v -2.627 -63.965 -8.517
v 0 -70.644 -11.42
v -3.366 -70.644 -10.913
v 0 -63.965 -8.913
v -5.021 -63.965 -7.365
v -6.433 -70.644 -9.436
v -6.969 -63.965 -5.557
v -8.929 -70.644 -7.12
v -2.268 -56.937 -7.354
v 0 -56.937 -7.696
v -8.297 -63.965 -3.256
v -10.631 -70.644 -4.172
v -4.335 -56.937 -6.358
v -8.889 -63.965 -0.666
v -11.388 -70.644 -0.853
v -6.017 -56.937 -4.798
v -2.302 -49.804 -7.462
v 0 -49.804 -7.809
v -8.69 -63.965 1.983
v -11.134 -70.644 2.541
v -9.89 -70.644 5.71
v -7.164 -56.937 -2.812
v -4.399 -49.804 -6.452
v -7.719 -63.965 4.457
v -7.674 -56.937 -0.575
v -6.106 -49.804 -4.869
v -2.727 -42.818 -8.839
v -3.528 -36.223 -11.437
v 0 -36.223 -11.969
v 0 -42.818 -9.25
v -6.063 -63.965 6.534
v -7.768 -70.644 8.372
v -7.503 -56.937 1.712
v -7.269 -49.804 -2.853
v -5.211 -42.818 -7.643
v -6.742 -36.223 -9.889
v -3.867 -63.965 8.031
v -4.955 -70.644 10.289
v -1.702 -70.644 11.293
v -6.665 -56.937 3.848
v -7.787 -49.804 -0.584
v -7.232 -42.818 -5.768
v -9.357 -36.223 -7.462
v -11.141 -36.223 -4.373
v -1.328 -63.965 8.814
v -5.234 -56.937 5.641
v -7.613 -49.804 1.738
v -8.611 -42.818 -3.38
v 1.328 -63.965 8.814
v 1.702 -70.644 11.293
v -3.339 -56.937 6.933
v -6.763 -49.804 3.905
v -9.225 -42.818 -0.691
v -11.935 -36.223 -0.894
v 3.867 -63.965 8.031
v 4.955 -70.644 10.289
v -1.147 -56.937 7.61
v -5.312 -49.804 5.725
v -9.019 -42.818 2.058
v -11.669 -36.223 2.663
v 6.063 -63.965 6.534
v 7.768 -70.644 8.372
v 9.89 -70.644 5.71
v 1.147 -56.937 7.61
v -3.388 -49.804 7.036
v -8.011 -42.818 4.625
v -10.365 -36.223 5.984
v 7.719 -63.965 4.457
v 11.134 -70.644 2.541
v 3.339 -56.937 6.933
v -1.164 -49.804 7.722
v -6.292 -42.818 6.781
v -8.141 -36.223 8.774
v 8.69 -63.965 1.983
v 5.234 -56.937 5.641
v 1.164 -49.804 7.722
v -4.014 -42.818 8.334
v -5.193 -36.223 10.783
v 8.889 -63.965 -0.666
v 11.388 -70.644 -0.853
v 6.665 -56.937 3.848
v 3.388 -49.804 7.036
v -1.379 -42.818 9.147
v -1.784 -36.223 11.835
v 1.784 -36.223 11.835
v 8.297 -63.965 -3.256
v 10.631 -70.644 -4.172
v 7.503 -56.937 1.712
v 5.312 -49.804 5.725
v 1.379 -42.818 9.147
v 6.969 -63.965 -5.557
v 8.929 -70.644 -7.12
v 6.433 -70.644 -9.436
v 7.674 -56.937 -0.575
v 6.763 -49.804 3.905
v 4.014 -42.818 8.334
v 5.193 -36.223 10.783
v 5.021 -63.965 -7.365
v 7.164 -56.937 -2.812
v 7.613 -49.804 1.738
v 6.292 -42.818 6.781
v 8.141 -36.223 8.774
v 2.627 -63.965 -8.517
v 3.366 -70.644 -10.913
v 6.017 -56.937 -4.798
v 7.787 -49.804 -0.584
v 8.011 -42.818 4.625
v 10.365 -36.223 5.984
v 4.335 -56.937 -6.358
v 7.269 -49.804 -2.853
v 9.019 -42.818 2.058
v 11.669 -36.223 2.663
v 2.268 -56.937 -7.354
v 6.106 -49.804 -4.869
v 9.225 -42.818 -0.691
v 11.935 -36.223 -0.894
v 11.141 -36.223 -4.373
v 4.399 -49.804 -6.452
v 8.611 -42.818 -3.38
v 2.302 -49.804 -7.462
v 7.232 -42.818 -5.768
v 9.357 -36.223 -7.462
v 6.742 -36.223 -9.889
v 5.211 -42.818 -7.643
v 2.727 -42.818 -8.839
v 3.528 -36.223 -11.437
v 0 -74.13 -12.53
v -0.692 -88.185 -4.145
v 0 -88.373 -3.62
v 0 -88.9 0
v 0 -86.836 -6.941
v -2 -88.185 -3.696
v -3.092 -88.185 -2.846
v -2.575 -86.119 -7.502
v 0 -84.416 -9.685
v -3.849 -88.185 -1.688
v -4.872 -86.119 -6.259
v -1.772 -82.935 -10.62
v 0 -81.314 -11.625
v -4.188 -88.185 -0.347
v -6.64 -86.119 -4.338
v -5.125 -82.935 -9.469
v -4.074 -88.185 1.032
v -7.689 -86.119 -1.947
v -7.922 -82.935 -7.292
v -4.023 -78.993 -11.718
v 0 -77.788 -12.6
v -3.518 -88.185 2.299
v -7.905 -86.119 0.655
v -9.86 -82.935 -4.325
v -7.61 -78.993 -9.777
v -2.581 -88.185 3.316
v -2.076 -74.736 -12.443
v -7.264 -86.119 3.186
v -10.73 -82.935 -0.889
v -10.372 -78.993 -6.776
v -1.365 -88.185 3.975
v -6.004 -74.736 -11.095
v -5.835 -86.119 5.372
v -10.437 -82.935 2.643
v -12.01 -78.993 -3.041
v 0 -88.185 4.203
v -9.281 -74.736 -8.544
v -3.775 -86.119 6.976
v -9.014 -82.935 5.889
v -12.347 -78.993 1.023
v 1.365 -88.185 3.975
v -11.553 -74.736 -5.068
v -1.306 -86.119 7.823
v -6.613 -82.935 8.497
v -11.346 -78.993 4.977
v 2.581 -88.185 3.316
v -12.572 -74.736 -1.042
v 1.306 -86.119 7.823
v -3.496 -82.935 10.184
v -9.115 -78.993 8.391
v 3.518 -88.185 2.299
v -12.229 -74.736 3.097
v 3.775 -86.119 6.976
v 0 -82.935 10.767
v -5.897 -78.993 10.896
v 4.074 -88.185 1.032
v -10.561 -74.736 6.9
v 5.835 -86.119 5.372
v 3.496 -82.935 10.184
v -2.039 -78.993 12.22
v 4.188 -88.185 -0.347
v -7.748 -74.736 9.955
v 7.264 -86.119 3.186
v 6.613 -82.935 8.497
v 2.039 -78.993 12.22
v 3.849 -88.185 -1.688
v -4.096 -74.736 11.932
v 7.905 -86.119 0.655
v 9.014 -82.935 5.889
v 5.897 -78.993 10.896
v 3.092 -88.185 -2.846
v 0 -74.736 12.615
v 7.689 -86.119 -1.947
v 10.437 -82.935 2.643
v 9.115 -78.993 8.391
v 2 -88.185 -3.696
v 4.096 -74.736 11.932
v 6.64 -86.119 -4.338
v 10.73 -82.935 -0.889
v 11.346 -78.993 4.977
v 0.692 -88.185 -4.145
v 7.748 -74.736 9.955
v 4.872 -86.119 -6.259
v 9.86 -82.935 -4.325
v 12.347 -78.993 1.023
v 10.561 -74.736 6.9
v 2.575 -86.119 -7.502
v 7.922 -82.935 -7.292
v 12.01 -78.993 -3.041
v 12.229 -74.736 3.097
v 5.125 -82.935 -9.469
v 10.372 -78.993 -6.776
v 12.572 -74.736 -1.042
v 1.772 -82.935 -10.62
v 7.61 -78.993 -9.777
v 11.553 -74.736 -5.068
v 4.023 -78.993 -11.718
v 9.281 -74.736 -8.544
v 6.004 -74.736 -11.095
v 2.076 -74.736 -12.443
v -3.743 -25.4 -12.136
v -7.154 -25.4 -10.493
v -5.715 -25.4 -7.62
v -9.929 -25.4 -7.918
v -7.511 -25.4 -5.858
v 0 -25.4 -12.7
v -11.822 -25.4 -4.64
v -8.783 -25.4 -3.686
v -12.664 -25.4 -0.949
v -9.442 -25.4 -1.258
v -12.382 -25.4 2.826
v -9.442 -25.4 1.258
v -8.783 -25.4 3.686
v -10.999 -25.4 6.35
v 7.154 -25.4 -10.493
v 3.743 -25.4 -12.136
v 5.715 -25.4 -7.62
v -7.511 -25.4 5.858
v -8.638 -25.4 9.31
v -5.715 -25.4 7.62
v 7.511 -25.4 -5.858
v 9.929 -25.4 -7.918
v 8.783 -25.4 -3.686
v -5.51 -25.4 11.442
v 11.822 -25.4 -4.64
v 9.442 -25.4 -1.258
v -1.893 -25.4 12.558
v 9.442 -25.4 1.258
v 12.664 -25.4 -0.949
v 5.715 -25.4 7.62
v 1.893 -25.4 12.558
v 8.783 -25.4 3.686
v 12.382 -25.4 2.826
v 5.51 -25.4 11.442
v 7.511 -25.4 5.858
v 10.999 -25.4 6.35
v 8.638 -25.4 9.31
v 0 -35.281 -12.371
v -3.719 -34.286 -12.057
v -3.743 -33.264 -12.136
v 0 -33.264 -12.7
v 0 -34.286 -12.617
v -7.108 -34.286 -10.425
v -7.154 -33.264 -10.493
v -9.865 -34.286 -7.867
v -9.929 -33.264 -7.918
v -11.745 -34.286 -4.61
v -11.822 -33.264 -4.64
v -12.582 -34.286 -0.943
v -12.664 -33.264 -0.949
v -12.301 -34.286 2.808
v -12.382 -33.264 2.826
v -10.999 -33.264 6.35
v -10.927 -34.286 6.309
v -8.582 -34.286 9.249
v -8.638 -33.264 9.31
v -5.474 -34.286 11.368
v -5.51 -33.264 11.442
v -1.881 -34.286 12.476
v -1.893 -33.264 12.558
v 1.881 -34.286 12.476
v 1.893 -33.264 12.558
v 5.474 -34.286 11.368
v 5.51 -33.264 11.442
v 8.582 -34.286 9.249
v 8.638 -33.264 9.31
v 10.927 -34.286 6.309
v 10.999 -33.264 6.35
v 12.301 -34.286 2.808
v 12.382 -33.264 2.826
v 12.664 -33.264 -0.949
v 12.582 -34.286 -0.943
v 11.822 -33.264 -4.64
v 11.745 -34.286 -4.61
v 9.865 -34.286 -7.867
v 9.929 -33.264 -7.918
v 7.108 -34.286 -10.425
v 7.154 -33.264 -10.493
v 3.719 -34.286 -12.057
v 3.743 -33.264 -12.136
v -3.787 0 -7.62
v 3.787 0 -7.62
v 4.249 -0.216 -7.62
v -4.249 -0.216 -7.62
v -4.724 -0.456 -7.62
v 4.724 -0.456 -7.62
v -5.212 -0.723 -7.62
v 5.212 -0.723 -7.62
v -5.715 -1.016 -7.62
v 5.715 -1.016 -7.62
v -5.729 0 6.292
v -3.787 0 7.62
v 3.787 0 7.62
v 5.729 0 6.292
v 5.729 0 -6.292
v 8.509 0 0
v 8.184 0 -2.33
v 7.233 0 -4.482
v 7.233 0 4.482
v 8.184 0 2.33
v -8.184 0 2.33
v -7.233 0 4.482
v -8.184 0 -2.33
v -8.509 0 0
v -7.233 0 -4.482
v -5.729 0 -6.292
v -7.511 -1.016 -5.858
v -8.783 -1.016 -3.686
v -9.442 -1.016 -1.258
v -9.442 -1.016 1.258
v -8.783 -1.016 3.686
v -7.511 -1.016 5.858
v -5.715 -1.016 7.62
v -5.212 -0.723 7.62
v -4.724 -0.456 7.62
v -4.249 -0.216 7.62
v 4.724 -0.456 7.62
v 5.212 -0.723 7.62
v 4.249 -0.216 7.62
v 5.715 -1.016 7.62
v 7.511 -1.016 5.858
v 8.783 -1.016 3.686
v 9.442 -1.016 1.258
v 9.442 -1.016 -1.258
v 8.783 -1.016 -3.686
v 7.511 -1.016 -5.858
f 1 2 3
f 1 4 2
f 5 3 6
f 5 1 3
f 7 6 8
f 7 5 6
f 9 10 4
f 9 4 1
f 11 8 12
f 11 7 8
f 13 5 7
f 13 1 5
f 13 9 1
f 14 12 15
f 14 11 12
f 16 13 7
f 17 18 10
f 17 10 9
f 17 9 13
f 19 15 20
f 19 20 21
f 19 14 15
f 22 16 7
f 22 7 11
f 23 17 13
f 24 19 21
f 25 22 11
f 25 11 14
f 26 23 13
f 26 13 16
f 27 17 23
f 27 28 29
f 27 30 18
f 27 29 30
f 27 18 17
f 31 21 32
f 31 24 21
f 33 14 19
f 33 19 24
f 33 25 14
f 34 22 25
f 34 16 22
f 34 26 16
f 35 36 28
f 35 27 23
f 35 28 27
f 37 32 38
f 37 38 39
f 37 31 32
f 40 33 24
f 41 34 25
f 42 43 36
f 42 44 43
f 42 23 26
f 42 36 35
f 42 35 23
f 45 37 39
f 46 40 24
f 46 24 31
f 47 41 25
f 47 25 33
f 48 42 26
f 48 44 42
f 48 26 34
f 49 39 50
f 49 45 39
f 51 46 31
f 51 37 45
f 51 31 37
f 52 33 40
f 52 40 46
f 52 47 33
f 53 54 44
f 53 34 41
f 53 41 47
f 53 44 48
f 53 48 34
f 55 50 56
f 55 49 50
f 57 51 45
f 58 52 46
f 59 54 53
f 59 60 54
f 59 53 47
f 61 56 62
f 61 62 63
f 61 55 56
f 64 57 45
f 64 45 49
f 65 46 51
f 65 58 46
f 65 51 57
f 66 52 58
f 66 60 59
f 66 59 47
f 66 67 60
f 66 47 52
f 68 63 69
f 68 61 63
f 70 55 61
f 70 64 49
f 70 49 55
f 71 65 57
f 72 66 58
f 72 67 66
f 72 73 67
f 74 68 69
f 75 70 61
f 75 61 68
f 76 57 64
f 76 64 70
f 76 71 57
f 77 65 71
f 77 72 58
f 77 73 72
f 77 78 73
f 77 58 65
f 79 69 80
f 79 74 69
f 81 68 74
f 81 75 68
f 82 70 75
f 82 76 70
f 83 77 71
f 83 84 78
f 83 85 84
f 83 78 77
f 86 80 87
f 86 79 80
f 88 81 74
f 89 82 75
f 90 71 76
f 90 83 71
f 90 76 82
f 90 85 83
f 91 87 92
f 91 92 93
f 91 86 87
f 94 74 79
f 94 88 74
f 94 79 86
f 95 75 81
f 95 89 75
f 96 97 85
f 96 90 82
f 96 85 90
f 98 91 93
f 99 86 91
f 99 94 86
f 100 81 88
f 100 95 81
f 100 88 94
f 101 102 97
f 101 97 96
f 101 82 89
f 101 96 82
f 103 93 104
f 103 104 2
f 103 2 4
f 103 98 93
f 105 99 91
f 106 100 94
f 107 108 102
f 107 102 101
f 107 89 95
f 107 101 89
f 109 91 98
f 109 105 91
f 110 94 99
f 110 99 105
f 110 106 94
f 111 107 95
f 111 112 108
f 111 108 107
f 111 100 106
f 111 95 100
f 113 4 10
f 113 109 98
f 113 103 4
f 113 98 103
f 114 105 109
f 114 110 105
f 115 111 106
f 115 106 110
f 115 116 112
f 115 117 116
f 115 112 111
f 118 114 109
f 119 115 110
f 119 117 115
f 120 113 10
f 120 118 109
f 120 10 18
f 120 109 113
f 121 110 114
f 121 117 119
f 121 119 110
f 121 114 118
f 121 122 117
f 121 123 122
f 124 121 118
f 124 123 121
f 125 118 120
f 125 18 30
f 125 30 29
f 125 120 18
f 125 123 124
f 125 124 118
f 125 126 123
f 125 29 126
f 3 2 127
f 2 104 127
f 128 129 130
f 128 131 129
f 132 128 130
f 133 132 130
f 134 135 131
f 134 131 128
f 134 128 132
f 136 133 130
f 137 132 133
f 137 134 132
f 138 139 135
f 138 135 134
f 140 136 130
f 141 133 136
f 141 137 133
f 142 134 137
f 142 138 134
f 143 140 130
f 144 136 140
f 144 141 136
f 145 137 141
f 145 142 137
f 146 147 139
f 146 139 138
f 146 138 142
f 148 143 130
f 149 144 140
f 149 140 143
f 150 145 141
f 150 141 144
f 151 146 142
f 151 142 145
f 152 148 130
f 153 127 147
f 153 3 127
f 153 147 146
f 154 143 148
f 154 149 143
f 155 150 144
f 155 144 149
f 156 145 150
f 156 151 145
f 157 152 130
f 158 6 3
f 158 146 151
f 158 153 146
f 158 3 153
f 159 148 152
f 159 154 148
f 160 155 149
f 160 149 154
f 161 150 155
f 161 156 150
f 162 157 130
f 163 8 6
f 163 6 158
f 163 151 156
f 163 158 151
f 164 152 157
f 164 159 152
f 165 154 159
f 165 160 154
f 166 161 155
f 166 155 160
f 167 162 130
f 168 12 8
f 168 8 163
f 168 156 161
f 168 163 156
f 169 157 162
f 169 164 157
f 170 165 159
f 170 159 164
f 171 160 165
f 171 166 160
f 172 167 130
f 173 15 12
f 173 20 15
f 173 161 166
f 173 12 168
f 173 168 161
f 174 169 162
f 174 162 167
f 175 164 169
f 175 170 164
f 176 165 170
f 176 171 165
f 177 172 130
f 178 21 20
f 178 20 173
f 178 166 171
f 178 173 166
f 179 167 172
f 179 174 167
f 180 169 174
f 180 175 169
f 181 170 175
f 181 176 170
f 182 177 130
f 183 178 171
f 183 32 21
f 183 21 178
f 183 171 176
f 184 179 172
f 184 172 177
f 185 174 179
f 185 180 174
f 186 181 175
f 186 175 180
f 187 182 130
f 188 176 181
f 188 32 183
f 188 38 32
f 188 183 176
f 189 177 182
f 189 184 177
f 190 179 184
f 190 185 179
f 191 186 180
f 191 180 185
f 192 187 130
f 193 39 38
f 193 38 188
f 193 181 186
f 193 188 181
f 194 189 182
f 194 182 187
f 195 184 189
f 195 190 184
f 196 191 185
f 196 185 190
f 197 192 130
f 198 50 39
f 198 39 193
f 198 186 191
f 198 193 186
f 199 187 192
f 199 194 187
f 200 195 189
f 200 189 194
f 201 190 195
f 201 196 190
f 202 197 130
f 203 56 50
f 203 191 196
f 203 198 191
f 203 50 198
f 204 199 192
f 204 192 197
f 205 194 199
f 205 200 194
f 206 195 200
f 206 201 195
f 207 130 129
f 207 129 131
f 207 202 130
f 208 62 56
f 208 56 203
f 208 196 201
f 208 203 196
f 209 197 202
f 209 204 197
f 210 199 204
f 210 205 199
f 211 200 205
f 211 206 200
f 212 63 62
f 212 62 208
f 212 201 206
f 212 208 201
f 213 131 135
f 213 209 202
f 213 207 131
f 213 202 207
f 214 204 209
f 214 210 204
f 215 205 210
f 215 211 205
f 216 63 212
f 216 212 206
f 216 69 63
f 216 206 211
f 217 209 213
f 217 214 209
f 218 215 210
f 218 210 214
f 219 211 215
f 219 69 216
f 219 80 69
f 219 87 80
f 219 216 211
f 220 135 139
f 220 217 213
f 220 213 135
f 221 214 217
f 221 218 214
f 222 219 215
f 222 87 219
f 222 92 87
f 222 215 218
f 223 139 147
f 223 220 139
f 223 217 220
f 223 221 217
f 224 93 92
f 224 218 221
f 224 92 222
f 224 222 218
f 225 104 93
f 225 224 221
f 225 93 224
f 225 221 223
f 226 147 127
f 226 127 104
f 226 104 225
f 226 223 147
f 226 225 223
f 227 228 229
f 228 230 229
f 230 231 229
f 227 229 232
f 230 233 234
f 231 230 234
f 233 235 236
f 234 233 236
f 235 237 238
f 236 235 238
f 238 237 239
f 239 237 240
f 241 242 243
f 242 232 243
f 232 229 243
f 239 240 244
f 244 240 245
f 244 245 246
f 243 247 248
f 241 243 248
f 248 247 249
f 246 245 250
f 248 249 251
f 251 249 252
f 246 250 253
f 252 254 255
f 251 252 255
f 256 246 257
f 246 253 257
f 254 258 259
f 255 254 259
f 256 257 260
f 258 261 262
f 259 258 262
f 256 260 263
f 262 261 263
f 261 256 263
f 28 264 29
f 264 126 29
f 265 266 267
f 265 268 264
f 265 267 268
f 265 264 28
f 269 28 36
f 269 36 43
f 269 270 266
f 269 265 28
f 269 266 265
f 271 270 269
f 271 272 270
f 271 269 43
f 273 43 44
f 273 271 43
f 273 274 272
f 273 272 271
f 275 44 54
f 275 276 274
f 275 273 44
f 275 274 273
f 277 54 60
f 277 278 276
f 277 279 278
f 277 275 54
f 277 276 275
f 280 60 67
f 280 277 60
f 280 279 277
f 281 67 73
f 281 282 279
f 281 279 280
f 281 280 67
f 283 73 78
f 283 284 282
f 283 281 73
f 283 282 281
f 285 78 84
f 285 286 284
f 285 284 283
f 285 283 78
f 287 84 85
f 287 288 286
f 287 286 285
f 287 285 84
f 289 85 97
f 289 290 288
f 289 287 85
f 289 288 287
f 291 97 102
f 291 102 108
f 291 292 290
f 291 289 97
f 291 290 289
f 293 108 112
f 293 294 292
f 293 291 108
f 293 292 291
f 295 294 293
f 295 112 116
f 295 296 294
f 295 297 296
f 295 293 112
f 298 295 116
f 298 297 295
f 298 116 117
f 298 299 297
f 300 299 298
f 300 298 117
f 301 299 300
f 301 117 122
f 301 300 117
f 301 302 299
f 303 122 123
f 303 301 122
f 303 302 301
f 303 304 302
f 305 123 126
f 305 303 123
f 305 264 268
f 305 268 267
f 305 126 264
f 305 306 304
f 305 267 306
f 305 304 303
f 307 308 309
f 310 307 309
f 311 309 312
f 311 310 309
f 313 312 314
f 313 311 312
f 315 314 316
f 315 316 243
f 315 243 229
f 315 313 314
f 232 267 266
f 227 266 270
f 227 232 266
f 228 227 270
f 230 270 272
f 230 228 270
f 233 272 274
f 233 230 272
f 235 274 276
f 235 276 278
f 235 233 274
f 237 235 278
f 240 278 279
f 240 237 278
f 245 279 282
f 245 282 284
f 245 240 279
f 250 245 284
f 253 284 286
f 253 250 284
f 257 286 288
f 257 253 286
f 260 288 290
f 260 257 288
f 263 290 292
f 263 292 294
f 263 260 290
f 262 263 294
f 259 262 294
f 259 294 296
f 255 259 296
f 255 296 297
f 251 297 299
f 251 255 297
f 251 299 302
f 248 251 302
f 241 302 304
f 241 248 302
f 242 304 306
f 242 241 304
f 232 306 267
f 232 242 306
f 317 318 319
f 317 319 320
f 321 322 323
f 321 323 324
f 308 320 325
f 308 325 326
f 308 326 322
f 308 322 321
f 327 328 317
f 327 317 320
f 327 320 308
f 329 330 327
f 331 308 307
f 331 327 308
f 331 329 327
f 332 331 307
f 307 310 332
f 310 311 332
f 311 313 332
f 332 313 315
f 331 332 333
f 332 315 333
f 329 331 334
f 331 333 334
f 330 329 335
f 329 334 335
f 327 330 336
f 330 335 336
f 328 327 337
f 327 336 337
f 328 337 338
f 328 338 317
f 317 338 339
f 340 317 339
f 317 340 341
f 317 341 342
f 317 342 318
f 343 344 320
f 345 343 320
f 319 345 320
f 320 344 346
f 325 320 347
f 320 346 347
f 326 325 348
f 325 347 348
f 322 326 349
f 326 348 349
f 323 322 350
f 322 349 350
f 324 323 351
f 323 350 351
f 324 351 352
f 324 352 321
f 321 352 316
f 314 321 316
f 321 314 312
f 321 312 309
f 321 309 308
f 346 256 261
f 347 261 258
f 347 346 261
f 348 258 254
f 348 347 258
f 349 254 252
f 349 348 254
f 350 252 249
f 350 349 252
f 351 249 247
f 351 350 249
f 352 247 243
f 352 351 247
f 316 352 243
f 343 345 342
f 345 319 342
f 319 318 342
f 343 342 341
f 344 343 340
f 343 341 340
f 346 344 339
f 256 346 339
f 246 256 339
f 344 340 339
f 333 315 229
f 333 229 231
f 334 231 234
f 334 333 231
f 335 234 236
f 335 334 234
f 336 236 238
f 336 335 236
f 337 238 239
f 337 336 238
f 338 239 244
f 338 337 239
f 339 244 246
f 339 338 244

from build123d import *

# Parameters (mm, degrees)
CHAMFER1_SIZE      = 1.016
CUT_EXTRUDE1_DEPTH = 25.4


with BuildPart() as part:
    # Sketch1 → Revolve1 (revolve)
    with BuildSketch(Plane.XY, mode=Mode.PRIVATE) as revolve1_sk:
        with BuildLine():
            Line((9.525, 0), (0, 0))
            Line((0, 0), (0, -88.9))
            ThreePointArc((0, -88.9), (10.766948848, -82.935192091), (11.420073815, -70.64375))
            ThreePointArc((11.420073815, -70.64375), (7.585132399, -53.36790313), (11.968613609, -36.223027708))
            ThreePointArc((11.968613609, -36.223027708), (12.514442246, -34.788226477), (12.7, -33.264365659))
            Line((12.7, -33.264365659), (12.7, -25.4))
            Line((12.7, -25.4), (9.525, -25.4))
            Line((9.525, -25.4), (9.525, 0))
        make_face()
    revolve(revolve1_sk.sketch.rotate(Axis((0, 0, 0), (0, 1, 0)), 90), axis=Axis((0, 0, 0), (0, 1, 0)))

    # Chamfer1
    chamfer1_edges = [part.edges().sort_by_distance(p)[0] for p in [
        (0, 0, 9.525),
    ]]
    chamfer(chamfer1_edges, length=CHAMFER1_SIZE)

    # Sketch2 → Cut-Extrude1 (cut)
    with BuildSketch(Plane(origin=(0, 0, 0), x_dir=(-1, 0, 0), z_dir=(0, 1, 0))):
        with BuildLine():
            Line((-5.715, 7.62), (5.715, 7.62))
            ThreePointArc((5.715, 7.62), (0, 9.525), (-5.715, 7.62))
        make_face()
        with BuildLine():
            Line((-5.715, -7.62), (5.715, -7.62))
            ThreePointArc((5.715, -7.62), (0, -9.525), (-5.715, -7.62))
        make_face()
    extrude(amount=-CUT_EXTRUDE1_DEPTH, mode=Mode.SUBTRACT)


solid = part.part
